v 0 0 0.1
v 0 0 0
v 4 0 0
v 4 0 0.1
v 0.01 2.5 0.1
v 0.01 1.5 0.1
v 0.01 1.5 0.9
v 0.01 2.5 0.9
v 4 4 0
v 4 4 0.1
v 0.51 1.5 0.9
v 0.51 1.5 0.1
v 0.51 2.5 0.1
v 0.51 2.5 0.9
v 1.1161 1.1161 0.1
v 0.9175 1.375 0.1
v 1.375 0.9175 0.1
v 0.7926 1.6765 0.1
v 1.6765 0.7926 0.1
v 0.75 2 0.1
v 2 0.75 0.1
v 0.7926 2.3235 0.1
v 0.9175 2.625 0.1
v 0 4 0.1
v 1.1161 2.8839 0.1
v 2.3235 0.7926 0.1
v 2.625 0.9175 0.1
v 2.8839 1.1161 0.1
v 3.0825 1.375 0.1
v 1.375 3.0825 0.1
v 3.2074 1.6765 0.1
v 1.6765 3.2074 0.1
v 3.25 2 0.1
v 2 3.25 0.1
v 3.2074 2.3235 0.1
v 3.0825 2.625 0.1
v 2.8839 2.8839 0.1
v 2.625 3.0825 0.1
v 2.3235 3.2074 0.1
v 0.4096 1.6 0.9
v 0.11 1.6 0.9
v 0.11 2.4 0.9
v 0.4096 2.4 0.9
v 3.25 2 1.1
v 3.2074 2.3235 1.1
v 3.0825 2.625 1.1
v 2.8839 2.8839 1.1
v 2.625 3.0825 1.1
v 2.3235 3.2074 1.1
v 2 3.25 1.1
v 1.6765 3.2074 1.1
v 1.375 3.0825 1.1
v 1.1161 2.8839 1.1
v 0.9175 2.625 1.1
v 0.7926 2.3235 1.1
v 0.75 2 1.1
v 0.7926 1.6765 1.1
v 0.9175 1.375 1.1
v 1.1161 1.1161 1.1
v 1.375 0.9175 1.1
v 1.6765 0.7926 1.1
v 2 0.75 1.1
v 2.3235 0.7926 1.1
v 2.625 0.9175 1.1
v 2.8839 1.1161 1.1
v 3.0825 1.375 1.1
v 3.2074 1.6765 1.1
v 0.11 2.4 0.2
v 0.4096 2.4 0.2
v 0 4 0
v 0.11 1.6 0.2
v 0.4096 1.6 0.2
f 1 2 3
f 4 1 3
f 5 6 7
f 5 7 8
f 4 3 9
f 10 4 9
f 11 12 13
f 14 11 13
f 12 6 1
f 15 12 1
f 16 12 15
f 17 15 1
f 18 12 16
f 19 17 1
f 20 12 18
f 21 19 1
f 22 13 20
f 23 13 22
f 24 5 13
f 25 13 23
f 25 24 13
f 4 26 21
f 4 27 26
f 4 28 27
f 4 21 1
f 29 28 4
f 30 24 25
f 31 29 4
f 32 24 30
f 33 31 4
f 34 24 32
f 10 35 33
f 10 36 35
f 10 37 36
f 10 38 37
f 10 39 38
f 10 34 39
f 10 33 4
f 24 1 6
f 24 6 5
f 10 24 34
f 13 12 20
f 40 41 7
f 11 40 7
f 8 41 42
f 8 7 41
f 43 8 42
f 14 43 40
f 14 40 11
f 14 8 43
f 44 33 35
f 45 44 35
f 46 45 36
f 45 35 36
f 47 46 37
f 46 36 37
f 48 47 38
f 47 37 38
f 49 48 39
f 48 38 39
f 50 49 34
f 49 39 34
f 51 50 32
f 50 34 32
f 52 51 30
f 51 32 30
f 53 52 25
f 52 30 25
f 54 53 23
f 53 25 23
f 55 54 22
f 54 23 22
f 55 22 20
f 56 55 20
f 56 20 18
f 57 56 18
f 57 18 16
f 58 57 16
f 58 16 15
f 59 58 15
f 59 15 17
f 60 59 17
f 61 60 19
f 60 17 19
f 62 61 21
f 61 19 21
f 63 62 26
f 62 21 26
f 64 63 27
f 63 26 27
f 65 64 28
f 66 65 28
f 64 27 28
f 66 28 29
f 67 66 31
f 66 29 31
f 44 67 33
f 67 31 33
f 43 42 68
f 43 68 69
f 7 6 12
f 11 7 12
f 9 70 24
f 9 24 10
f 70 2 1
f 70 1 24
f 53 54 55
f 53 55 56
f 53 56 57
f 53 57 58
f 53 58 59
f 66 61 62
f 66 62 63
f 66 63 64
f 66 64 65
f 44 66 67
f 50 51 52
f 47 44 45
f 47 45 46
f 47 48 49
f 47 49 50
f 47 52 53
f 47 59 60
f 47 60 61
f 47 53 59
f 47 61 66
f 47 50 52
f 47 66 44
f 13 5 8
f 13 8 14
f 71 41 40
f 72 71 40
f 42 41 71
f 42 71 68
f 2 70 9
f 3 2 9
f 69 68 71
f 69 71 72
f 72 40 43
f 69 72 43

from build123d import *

# Parameters (mm, degrees)
ESQUISSE1_W             = 4
ESQUISSE1_H             = 4
BOSS_EXTRU_1_DEPTH      = 0.1
ESQUISSE2_R             = 1.25
BOSS_EXTRU_2_DEPTH      = 1
ESQUISSE4_W             = 0.5
ESQUISSE4_H             = 1
BOSS_EXTRU_3_DEPTH      = 0.8
ESQUISSE5_W             = 0.299566549
ESQUISSE5_H             = 0.8
ENL_V_MAT_EXTRU_1_DEPTH = 0.7


with BuildPart() as part:
    # Esquisse1 → Boss.-Extru.1 (new body)
    with BuildSketch(Plane.XY):
        with Locations((2, 2)):
            Rectangle(ESQUISSE1_W, ESQUISSE1_H)
    extrude(amount=BOSS_EXTRU_1_DEPTH)

    # Esquisse2 → Boss.-Extru.2 (add)
    with BuildSketch(Plane.XY.offset(0.1)):
        with Locations((2, 2)):
            Circle(ESQUISSE2_R)
    extrude(amount=BOSS_EXTRU_2_DEPTH)

    # Esquisse4 → Boss.-Extru.3 (add)
    with BuildSketch(Plane.XY.offset(0.1)):
        with Locations((0.26, 2)):
            Rectangle(ESQUISSE4_W, ESQUISSE4_H)
    extrude(amount=BOSS_EXTRU_3_DEPTH)

    # Esquisse5 → Enlèv. mat.-Extru.1 (cut)
    with BuildSketch(Plane.XY.offset(0.9)):
        with Locations((0.259783274, 2)):
            Rectangle(ESQUISSE5_W, ESQUISSE5_H)
    extrude(amount=-ENL_V_MAT_EXTRU_1_DEPTH, mode=Mode.SUBTRACT)


solid = part.part
